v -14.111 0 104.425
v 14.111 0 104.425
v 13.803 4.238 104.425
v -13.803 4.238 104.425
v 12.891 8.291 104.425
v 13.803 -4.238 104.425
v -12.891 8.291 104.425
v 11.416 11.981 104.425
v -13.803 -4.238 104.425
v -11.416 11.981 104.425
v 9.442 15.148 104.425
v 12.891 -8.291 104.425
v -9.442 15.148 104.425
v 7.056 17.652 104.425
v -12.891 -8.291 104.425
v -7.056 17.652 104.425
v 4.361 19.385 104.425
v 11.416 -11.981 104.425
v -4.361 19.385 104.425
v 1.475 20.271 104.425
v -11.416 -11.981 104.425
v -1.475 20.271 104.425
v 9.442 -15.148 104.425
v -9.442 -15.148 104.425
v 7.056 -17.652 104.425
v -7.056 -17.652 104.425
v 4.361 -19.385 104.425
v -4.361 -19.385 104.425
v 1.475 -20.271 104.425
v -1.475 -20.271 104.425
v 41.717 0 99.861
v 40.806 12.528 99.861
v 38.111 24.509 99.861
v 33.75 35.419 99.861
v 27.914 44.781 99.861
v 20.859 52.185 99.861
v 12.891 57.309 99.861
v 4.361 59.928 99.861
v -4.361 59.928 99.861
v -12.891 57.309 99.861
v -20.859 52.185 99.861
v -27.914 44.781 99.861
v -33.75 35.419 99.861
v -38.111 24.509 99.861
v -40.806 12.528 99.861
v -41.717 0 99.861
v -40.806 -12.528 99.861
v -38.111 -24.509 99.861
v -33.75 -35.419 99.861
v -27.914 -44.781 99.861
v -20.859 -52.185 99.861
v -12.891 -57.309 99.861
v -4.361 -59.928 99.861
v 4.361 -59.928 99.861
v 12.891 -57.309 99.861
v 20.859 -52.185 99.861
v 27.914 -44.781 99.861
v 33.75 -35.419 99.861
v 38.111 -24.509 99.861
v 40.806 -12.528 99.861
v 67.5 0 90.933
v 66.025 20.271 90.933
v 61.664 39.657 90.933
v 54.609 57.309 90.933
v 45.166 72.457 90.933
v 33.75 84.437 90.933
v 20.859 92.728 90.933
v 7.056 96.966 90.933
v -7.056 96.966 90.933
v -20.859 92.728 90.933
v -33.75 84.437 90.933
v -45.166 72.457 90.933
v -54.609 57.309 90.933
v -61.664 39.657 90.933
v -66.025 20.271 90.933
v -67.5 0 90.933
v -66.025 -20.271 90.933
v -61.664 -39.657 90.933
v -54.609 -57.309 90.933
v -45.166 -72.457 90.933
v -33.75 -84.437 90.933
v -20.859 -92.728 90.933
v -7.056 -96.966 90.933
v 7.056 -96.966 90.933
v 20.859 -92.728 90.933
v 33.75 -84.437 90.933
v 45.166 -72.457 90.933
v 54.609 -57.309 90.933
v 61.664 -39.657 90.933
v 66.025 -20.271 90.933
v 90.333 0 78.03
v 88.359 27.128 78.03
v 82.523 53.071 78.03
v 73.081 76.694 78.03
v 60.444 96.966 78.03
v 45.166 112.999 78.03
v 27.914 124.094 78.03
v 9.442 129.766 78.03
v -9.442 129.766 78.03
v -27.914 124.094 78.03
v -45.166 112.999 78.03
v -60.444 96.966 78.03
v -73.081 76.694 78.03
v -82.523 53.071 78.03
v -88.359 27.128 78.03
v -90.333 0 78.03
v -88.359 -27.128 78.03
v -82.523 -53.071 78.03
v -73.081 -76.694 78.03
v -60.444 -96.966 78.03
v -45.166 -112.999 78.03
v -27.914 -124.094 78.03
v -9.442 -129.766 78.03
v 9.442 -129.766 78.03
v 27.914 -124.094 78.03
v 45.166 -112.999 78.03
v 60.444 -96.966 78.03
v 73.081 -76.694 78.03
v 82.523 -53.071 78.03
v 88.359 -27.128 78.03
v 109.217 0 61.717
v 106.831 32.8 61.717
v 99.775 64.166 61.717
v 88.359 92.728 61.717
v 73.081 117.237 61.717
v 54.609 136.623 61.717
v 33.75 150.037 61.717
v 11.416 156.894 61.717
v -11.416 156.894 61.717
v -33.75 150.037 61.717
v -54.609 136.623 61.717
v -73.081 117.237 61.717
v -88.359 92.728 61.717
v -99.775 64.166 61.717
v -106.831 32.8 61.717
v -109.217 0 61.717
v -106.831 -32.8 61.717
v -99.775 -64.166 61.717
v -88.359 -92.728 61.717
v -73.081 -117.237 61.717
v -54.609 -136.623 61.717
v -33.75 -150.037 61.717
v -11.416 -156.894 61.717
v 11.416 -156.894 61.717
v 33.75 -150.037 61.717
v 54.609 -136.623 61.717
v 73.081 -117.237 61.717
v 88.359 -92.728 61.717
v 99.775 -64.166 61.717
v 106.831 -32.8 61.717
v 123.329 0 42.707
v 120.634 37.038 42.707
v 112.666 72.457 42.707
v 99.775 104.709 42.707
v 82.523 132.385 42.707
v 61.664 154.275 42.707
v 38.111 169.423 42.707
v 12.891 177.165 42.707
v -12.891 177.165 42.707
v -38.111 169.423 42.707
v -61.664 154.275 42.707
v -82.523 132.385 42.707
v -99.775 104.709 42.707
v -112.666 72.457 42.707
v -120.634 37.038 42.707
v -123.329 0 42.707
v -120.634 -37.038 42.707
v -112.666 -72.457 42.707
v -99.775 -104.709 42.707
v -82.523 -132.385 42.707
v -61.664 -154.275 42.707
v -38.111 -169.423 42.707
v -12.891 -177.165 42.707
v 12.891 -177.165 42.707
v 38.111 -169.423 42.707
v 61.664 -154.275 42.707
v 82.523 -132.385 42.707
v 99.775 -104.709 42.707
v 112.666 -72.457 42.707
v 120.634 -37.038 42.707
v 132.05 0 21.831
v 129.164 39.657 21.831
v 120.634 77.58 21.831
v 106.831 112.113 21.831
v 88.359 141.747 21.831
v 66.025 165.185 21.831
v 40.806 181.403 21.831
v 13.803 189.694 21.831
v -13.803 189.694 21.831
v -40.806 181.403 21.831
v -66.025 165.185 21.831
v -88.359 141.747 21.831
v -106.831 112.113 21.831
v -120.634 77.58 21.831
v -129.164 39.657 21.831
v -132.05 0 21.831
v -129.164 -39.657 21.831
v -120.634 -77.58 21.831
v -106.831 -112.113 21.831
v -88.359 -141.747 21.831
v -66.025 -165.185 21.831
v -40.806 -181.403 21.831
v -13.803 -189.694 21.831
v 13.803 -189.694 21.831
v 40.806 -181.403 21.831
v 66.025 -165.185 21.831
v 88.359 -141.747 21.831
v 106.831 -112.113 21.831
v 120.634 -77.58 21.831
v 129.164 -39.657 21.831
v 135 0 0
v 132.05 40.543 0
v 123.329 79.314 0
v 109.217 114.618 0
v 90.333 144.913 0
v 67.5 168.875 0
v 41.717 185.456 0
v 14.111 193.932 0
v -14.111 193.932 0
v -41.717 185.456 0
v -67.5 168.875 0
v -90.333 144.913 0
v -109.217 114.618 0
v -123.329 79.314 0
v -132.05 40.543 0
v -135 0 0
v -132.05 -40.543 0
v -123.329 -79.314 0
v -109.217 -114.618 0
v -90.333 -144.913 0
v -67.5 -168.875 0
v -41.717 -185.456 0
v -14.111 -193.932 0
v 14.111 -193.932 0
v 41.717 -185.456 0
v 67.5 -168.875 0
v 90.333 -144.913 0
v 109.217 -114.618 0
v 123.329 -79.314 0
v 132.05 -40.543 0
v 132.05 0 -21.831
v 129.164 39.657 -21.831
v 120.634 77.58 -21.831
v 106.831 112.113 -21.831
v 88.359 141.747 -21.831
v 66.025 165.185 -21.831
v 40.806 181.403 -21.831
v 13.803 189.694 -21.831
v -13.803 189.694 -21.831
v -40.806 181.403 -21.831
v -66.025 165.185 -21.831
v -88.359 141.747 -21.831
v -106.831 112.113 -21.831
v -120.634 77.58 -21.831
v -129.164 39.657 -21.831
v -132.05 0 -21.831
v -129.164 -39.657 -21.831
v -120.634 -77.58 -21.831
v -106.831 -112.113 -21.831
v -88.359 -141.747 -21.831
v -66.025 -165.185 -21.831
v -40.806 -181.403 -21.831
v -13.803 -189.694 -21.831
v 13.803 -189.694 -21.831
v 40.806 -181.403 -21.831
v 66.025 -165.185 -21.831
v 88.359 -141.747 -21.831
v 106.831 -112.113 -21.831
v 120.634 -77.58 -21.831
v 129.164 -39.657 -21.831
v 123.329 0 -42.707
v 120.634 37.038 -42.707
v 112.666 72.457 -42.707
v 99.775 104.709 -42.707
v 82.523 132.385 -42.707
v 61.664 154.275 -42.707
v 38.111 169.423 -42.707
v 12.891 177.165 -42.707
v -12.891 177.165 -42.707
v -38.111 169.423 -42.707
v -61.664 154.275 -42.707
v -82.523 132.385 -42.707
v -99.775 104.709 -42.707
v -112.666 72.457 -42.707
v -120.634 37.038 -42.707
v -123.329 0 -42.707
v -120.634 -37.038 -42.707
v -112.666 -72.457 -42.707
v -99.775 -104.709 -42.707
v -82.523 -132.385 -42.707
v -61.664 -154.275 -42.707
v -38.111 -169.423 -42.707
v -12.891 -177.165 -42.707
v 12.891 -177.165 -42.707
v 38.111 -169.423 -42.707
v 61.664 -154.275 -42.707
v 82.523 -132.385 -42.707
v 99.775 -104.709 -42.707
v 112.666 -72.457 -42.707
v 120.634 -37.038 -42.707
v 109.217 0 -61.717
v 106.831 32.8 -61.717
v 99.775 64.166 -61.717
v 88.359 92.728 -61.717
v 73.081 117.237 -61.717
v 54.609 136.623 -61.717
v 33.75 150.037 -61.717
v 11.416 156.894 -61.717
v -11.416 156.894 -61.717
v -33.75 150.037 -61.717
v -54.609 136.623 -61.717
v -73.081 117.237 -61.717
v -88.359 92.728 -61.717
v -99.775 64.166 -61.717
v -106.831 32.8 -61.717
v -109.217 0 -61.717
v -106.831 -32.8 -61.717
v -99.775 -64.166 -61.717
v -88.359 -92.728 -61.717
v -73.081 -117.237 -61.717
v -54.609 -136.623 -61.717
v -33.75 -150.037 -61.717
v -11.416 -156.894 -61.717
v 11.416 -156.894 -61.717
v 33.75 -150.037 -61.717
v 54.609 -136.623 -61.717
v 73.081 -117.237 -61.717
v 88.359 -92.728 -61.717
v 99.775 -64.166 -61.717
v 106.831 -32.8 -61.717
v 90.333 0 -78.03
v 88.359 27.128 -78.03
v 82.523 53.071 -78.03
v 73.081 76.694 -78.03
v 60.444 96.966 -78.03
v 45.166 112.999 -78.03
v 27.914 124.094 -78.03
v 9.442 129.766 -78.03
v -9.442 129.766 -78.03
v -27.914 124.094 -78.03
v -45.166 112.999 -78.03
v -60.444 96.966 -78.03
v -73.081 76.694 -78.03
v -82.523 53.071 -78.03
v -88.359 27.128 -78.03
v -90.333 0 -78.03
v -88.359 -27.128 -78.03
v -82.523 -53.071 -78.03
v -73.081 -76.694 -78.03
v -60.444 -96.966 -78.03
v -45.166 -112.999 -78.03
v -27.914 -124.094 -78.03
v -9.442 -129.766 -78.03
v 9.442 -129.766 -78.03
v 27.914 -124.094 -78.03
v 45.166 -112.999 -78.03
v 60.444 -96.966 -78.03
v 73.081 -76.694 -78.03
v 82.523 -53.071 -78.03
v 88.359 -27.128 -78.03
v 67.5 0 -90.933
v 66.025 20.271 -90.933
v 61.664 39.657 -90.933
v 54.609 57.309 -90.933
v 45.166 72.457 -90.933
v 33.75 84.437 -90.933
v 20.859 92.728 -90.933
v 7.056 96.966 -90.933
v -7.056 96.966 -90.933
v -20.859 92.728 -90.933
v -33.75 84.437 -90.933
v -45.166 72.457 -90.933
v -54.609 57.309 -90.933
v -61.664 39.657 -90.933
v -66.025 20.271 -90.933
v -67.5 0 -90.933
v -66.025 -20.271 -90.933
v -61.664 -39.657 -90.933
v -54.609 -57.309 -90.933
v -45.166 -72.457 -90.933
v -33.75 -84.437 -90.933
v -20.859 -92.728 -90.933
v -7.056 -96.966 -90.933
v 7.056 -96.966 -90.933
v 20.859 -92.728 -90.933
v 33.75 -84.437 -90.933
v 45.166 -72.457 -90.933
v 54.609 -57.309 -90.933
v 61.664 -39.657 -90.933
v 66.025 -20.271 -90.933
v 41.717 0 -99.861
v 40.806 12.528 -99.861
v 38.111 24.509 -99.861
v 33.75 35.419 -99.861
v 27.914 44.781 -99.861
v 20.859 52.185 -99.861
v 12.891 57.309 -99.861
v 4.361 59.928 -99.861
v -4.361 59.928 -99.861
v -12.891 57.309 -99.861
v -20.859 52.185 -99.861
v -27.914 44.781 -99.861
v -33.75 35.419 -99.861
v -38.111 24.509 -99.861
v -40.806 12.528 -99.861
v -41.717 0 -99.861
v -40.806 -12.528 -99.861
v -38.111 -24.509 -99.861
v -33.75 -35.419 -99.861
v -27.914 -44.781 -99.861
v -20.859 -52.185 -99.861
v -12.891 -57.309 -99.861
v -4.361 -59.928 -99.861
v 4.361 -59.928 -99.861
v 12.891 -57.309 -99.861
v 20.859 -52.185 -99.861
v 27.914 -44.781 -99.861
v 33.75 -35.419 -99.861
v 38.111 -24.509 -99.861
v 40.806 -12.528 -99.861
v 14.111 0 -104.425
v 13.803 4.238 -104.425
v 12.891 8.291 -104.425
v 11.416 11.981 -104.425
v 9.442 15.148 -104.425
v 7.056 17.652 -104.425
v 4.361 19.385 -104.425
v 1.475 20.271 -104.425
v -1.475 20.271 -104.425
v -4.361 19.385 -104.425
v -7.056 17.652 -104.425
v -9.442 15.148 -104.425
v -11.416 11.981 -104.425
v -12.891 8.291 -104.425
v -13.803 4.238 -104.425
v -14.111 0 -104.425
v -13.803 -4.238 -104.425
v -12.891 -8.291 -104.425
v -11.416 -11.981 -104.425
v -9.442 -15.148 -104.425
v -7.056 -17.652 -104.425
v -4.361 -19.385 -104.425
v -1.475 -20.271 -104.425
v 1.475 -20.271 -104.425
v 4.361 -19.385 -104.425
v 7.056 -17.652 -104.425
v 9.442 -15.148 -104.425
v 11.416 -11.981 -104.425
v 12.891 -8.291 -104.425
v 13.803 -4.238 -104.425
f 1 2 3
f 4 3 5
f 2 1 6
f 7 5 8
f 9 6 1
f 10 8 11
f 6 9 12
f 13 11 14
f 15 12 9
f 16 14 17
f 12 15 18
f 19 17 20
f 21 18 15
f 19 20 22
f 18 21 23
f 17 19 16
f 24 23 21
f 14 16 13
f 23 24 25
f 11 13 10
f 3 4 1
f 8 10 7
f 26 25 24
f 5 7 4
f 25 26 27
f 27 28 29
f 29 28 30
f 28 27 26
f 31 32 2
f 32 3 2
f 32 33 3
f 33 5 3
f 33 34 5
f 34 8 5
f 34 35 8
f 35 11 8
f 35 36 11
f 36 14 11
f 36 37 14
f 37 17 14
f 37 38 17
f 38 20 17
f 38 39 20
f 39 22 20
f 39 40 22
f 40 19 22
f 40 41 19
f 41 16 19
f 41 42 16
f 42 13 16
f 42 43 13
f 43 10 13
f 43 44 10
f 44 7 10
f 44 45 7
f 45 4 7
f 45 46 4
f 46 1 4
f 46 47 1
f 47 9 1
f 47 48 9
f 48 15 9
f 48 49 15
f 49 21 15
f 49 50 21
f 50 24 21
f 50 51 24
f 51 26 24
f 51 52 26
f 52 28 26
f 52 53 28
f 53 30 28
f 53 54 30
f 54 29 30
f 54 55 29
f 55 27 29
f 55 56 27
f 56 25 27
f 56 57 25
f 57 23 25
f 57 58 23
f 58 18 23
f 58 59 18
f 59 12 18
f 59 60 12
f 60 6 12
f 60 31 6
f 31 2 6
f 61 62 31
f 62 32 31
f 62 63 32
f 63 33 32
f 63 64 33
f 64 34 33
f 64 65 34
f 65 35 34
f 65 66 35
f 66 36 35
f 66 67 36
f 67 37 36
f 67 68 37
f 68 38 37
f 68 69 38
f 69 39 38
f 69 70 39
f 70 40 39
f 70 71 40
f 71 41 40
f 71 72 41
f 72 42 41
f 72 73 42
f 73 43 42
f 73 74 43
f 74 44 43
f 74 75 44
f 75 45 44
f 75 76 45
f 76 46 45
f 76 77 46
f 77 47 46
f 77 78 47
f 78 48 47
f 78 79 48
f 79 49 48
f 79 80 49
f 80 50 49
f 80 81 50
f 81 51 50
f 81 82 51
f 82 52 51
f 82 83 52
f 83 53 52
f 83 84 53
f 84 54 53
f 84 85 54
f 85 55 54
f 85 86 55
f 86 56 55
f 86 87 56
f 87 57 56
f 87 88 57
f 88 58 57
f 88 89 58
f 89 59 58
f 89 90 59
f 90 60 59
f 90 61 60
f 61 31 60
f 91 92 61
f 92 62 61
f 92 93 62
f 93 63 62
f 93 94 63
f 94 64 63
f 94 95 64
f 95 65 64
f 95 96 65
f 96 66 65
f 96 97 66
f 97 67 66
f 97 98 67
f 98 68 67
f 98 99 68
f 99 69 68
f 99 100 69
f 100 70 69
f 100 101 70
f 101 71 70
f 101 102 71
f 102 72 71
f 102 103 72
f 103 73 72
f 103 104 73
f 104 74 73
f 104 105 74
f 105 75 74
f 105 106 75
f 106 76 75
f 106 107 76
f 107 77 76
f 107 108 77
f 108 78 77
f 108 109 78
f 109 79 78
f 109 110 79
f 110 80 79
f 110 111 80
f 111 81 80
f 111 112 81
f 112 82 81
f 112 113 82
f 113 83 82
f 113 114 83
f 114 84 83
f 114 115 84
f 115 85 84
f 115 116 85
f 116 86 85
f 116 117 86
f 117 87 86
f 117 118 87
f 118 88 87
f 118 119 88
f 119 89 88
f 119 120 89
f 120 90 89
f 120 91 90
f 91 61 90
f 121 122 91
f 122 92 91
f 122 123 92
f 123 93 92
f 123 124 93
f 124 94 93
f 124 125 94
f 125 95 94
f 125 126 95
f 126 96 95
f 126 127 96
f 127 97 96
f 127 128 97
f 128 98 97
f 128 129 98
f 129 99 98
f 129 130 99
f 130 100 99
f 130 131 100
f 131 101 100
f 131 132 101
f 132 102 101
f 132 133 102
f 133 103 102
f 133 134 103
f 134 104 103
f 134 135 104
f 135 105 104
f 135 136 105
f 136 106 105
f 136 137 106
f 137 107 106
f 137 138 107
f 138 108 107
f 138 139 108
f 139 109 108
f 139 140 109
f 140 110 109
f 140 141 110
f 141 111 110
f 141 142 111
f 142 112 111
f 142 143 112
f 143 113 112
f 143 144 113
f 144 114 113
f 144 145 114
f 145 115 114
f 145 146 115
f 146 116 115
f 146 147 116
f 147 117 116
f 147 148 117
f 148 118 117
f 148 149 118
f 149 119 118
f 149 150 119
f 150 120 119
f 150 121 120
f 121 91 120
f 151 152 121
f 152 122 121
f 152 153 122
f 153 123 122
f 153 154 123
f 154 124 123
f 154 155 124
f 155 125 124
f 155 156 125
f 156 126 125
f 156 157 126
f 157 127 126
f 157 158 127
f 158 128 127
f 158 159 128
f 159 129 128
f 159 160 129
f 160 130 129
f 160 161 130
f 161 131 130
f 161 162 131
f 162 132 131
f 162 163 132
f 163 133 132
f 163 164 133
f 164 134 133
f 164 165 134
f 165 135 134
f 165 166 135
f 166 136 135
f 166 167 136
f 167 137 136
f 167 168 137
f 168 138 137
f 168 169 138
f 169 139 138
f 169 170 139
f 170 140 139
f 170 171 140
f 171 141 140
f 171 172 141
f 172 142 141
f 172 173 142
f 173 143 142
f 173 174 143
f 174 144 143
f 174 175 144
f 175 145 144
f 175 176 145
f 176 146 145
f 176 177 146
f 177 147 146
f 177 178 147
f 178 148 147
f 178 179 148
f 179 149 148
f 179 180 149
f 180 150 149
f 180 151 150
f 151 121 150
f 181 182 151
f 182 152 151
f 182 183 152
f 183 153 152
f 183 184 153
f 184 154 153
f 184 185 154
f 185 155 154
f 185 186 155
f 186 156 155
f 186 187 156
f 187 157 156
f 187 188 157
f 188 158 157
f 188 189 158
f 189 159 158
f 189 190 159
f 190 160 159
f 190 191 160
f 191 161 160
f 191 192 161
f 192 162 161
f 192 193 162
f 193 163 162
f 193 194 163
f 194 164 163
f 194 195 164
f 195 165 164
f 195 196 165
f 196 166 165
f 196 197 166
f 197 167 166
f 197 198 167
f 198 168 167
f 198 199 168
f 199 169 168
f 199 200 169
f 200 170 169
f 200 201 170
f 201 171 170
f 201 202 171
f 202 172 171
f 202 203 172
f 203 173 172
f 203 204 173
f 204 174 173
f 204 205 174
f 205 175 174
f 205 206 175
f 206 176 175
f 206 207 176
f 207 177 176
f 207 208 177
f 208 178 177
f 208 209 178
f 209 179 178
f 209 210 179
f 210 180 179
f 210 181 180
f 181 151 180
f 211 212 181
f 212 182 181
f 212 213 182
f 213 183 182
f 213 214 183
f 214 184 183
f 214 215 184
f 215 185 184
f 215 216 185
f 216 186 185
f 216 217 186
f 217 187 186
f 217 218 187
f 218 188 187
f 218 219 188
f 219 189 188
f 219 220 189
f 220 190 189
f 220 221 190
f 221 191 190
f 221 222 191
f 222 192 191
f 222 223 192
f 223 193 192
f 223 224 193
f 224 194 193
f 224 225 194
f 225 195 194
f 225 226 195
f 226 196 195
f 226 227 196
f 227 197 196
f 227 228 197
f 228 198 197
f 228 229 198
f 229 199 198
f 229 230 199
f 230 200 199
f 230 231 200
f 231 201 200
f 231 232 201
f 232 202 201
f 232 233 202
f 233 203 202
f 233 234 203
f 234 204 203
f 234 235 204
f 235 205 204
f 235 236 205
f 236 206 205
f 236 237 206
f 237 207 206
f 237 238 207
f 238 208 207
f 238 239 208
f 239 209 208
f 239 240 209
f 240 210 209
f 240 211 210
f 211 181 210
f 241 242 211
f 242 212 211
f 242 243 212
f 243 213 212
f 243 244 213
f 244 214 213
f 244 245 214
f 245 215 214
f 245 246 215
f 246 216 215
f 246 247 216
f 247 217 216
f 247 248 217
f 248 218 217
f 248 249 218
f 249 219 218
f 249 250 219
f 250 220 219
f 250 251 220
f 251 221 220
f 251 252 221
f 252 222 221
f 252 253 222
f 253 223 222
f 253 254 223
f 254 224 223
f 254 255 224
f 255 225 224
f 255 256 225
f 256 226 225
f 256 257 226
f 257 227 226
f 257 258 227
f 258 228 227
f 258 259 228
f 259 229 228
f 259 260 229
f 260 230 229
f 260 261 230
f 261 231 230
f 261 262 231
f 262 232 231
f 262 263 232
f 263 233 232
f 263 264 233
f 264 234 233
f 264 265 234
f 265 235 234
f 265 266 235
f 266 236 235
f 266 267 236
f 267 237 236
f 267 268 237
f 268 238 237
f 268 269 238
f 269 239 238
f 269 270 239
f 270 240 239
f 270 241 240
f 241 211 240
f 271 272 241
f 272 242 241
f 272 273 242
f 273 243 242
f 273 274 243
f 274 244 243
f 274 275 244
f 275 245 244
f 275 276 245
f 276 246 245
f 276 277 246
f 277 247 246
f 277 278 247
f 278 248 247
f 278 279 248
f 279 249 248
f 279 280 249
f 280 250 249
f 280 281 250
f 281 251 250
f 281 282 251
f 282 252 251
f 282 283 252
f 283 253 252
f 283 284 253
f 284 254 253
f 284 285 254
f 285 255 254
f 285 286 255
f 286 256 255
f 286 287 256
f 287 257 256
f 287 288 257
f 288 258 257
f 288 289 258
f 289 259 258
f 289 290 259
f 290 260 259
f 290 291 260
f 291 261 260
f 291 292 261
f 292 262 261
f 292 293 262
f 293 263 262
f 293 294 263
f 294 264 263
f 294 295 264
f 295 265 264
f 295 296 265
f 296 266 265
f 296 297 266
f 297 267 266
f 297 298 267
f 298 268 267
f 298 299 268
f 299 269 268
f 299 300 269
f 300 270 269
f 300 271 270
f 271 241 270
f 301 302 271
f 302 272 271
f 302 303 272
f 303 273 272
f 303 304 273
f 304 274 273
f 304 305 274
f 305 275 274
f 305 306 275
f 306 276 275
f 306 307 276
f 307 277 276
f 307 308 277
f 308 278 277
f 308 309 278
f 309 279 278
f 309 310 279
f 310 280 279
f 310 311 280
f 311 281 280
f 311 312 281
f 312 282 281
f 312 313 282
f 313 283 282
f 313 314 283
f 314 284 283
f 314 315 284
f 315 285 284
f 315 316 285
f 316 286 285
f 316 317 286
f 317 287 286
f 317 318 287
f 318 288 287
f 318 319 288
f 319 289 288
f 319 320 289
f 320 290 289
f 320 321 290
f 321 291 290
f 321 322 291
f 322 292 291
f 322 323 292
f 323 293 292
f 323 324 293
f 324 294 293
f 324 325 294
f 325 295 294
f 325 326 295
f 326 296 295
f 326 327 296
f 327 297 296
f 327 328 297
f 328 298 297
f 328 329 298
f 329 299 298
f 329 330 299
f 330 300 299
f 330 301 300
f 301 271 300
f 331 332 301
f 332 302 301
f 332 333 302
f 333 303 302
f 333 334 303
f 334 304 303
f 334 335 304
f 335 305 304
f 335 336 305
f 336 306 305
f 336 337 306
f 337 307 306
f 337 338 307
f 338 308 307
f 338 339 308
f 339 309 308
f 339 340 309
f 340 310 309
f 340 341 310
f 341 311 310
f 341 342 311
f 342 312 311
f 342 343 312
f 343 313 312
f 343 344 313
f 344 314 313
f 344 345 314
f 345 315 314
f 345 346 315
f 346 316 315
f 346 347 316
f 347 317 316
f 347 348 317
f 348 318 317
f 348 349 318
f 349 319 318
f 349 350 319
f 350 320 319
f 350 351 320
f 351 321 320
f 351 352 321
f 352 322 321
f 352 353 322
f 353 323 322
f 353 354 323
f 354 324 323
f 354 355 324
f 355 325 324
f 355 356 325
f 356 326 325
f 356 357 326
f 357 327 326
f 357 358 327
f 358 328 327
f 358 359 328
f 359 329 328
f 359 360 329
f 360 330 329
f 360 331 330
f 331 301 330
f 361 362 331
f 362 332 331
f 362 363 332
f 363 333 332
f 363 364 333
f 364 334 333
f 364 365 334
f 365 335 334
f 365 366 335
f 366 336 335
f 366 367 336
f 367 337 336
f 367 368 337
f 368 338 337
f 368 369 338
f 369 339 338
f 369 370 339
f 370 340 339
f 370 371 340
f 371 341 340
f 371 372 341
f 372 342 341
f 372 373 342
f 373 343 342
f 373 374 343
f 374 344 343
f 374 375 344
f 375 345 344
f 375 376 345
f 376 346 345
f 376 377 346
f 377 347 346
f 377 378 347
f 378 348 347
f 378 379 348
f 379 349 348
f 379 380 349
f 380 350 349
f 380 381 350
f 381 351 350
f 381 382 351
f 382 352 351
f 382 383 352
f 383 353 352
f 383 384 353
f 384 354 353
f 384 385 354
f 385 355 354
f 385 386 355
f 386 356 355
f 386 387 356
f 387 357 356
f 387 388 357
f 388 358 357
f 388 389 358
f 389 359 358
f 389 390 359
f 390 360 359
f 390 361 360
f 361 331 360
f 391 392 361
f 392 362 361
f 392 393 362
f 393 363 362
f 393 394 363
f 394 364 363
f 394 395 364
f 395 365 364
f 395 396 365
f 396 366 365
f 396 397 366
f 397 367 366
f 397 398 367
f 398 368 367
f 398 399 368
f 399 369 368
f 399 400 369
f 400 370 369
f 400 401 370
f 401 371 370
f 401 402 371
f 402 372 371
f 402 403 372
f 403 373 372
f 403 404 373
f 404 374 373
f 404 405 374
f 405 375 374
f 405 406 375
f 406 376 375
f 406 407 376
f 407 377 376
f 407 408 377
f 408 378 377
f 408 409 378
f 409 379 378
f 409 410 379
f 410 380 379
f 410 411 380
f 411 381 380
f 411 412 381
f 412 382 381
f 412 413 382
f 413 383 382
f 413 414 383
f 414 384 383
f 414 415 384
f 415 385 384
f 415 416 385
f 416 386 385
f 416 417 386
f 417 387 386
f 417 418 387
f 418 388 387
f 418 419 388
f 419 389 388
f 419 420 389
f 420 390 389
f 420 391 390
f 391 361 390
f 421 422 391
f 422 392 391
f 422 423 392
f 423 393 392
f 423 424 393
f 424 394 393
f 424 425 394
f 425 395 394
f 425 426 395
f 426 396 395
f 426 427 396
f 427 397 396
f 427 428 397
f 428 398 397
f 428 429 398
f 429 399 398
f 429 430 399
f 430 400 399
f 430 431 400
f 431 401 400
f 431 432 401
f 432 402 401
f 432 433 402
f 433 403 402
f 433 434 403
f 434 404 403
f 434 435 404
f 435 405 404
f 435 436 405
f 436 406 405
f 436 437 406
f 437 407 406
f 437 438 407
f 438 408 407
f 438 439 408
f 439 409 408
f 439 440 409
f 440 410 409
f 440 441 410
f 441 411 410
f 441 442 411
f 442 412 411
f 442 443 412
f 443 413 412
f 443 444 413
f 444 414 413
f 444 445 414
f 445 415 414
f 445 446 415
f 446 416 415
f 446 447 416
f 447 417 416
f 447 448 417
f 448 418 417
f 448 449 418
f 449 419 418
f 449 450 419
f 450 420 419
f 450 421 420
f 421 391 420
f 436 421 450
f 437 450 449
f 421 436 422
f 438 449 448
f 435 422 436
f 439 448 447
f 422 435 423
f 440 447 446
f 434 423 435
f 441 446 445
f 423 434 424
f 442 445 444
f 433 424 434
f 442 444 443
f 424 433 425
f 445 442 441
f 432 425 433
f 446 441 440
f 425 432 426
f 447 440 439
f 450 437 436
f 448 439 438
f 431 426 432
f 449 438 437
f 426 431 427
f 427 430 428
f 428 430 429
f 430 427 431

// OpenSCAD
// Generated by SolidPython 1.0.1 on 2020-07-29 00:46:48


scale(v = [9, 13, 7]) {
	sphere(r = 15);
}
/***********************************************
*********      SolidPython code:      **********
************************************************
 
# import packages: SolidPython
from solid import *
from solid.utils import *
from itertools import chain, combinations, permutations


class Resize:

    def __init__(self, scad_file):
        self.scad_file = scad_file
        #self.scad_file = import_scad(scad_file)
        # cone/cylinder param:
        self.r1 = 0
        self.r2 = 0
        self.h = 0
        # rectangular prism param:
        self.w = 0
        self.l = 0
        # ellipse param:
        self.r = 0

    # import OpenScad code (file name corresponds to shape)


    # classify shape + parameters
    def assign(self, param1, param2, param3):
        if self.scad_file == 'cone.scad':
            self.r1 = param1
            self.r2 = param2
            self.h = param3
        elif self.scad_file == 'cylinder.scad':
            self.r1 = param1
            self.r2 = param2
            self.h = param3
        elif self.scad_file == 'rectangularPrism.scad':
            self.h = param1
            self.l = param2
            self.w = param3
        else:
            self.r = param1
            self.h = param2

    # resize parameters
    def iterate(self):
        x = range(3, 20, 2)
        i = 1
        if self.scad_file == 'cone.scad':
            tempList = list(permutations(x, 2))
            for temp in tempList:
                param1 = temp[0]
                param2 = temp[1]
                filepath = 'produced_scad_files/' + 'cone' + str(param1) + '_' + str(param2) + '_' + '.scad'
                scad_render_to_file(cylinder(h=param1, r1=param2, r2=0), filepath)

        elif self.scad_file == 'cylinder.scad':
            tempList = list(permutations(x, 3))
            for temp in tempList:
                param1 = temp[0]
                param2 = temp[1]
                filepath = 'produced_scad_files/' + 'cylinder' + str(param1) + '_' + str(param2) + '_' + '.scad'
                scad_render_to_file(cylinder(h=param1, r1=param2, r2=param2), filepath)

        elif self.scad_file == 'rectangularPrism.scad':
            tempList = list(permutations(x, 3))
            for temp in tempList:
                param1 = temp[0]
                param2 = temp[1]
                param3 = temp[2]
                filepath = 'produced_scad_files/' + 'rectangularPrism' + str(param1) + '_' + str(param2) + '_' + str(
                    param3) + '.scad'
                scad_render_to_file(cube(size=(param1, param2, param3)), filepath)

        elif self.scad_file == 'ellipse.scad':
            tempList = list(permutations(x, 4))
            for temp in tempList:
                param1 = temp[0]
                param2 = temp[1]
                param3 = temp[2]
                param4 = temp[3]
                filepath = 'produced_scad_files/' + 'ellipse' + str(param1) + '_' + str(param2) + '_' + str(param3) + '_' + str(param4) + '.scad'
                scad_render_to_file(scale([param1, param2, param3])(sphere(r=param4)), filepath)

    def render_to_scadfile(self):
        scad_render_to_file(scad, 'example.scad') 
 
************************************************/
